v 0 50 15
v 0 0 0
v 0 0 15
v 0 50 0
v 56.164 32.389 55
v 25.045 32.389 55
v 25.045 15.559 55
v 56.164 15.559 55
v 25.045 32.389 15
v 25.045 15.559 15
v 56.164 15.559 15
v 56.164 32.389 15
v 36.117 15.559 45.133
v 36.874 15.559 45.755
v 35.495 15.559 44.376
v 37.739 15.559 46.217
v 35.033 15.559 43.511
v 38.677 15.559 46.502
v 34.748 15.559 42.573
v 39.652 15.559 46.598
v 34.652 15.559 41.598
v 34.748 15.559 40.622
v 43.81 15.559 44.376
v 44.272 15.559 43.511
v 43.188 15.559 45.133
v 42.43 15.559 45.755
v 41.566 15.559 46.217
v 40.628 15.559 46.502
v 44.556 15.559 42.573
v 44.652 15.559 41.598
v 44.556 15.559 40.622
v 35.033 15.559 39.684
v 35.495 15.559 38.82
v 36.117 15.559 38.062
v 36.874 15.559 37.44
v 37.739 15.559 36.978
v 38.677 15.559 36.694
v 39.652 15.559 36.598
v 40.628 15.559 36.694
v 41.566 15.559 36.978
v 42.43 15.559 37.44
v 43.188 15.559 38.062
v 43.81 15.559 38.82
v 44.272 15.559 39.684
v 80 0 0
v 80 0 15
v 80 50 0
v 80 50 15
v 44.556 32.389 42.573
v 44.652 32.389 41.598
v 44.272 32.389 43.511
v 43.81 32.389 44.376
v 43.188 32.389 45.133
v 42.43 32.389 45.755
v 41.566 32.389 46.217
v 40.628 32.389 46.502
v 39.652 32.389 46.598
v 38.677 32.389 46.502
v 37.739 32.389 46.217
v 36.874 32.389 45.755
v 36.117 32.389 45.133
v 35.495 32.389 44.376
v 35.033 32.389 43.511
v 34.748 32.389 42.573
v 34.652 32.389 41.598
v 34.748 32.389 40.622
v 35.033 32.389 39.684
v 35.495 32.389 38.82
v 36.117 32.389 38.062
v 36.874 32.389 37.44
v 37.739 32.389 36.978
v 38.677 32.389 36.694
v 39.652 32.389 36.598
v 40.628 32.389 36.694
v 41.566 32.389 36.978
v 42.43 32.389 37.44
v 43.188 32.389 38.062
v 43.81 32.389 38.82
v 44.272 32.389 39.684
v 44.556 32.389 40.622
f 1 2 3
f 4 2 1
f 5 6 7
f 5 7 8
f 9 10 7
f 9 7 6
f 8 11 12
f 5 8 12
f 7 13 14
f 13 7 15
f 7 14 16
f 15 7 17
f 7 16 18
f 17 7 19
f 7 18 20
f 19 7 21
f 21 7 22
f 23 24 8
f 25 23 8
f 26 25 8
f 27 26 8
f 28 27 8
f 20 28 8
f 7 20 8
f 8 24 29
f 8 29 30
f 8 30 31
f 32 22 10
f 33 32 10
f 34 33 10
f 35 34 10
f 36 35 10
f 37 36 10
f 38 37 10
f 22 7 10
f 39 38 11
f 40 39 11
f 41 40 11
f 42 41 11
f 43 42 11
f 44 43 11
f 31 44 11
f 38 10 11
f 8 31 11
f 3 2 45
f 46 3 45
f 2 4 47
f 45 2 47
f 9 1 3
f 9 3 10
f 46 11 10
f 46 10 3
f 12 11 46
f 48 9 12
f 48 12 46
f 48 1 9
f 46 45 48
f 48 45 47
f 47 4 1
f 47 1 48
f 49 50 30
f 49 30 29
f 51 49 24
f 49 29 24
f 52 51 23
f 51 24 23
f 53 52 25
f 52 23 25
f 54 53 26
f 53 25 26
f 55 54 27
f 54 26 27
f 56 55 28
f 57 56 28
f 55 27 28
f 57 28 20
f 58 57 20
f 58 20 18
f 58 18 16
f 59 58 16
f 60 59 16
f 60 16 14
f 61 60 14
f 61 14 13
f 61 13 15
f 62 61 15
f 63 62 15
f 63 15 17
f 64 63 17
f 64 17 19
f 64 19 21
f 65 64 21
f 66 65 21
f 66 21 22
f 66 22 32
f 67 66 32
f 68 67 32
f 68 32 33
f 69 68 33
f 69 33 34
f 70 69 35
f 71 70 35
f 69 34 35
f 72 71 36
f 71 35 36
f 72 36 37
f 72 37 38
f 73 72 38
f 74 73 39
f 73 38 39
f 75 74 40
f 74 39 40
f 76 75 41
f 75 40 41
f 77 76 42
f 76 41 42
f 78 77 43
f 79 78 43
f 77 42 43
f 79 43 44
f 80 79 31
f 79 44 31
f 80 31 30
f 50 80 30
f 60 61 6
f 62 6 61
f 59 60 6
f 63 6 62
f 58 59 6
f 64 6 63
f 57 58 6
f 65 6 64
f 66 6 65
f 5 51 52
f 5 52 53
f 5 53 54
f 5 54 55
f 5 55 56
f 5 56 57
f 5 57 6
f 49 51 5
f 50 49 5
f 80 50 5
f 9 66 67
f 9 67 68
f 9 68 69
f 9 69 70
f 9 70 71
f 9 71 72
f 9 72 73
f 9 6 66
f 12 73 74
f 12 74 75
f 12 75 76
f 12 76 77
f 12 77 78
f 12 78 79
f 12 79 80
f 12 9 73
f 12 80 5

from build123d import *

# Parameters (mm, degrees)
F0_W     = 80
F0_H     = 50
F1_DEPTH = 15
F2_W     = 31.118957
F2_H     = 16.829639
F3_DEPTH = 40
F4_R     = 5
F5_DEPTH = 34.441523


with BuildPart() as f1:
    # F0 (on Top) → F1 (new body)
    with BuildSketch(Plane.XY):
        with Locations((40, 25)):
            Rectangle(F0_W, F0_H)
    extrude(amount=F1_DEPTH)

    # F2 (on face) → F3 (join)
    with BuildSketch(Plane.XY.offset(15)):
        with Locations((40.604838, 23.974297)):
            Rectangle(F2_W, F2_H)
    extrude(amount=F3_DEPTH)

    # F4 (on face) → F5 (cut, through all)
    with BuildSketch(Plane.XZ.offset(-15.559477)):
        with Locations((39.652213, 41.597784)):
            Circle(F4_R)
    extrude(amount=-F5_DEPTH, mode=Mode.SUBTRACT)


solid = f1.part
